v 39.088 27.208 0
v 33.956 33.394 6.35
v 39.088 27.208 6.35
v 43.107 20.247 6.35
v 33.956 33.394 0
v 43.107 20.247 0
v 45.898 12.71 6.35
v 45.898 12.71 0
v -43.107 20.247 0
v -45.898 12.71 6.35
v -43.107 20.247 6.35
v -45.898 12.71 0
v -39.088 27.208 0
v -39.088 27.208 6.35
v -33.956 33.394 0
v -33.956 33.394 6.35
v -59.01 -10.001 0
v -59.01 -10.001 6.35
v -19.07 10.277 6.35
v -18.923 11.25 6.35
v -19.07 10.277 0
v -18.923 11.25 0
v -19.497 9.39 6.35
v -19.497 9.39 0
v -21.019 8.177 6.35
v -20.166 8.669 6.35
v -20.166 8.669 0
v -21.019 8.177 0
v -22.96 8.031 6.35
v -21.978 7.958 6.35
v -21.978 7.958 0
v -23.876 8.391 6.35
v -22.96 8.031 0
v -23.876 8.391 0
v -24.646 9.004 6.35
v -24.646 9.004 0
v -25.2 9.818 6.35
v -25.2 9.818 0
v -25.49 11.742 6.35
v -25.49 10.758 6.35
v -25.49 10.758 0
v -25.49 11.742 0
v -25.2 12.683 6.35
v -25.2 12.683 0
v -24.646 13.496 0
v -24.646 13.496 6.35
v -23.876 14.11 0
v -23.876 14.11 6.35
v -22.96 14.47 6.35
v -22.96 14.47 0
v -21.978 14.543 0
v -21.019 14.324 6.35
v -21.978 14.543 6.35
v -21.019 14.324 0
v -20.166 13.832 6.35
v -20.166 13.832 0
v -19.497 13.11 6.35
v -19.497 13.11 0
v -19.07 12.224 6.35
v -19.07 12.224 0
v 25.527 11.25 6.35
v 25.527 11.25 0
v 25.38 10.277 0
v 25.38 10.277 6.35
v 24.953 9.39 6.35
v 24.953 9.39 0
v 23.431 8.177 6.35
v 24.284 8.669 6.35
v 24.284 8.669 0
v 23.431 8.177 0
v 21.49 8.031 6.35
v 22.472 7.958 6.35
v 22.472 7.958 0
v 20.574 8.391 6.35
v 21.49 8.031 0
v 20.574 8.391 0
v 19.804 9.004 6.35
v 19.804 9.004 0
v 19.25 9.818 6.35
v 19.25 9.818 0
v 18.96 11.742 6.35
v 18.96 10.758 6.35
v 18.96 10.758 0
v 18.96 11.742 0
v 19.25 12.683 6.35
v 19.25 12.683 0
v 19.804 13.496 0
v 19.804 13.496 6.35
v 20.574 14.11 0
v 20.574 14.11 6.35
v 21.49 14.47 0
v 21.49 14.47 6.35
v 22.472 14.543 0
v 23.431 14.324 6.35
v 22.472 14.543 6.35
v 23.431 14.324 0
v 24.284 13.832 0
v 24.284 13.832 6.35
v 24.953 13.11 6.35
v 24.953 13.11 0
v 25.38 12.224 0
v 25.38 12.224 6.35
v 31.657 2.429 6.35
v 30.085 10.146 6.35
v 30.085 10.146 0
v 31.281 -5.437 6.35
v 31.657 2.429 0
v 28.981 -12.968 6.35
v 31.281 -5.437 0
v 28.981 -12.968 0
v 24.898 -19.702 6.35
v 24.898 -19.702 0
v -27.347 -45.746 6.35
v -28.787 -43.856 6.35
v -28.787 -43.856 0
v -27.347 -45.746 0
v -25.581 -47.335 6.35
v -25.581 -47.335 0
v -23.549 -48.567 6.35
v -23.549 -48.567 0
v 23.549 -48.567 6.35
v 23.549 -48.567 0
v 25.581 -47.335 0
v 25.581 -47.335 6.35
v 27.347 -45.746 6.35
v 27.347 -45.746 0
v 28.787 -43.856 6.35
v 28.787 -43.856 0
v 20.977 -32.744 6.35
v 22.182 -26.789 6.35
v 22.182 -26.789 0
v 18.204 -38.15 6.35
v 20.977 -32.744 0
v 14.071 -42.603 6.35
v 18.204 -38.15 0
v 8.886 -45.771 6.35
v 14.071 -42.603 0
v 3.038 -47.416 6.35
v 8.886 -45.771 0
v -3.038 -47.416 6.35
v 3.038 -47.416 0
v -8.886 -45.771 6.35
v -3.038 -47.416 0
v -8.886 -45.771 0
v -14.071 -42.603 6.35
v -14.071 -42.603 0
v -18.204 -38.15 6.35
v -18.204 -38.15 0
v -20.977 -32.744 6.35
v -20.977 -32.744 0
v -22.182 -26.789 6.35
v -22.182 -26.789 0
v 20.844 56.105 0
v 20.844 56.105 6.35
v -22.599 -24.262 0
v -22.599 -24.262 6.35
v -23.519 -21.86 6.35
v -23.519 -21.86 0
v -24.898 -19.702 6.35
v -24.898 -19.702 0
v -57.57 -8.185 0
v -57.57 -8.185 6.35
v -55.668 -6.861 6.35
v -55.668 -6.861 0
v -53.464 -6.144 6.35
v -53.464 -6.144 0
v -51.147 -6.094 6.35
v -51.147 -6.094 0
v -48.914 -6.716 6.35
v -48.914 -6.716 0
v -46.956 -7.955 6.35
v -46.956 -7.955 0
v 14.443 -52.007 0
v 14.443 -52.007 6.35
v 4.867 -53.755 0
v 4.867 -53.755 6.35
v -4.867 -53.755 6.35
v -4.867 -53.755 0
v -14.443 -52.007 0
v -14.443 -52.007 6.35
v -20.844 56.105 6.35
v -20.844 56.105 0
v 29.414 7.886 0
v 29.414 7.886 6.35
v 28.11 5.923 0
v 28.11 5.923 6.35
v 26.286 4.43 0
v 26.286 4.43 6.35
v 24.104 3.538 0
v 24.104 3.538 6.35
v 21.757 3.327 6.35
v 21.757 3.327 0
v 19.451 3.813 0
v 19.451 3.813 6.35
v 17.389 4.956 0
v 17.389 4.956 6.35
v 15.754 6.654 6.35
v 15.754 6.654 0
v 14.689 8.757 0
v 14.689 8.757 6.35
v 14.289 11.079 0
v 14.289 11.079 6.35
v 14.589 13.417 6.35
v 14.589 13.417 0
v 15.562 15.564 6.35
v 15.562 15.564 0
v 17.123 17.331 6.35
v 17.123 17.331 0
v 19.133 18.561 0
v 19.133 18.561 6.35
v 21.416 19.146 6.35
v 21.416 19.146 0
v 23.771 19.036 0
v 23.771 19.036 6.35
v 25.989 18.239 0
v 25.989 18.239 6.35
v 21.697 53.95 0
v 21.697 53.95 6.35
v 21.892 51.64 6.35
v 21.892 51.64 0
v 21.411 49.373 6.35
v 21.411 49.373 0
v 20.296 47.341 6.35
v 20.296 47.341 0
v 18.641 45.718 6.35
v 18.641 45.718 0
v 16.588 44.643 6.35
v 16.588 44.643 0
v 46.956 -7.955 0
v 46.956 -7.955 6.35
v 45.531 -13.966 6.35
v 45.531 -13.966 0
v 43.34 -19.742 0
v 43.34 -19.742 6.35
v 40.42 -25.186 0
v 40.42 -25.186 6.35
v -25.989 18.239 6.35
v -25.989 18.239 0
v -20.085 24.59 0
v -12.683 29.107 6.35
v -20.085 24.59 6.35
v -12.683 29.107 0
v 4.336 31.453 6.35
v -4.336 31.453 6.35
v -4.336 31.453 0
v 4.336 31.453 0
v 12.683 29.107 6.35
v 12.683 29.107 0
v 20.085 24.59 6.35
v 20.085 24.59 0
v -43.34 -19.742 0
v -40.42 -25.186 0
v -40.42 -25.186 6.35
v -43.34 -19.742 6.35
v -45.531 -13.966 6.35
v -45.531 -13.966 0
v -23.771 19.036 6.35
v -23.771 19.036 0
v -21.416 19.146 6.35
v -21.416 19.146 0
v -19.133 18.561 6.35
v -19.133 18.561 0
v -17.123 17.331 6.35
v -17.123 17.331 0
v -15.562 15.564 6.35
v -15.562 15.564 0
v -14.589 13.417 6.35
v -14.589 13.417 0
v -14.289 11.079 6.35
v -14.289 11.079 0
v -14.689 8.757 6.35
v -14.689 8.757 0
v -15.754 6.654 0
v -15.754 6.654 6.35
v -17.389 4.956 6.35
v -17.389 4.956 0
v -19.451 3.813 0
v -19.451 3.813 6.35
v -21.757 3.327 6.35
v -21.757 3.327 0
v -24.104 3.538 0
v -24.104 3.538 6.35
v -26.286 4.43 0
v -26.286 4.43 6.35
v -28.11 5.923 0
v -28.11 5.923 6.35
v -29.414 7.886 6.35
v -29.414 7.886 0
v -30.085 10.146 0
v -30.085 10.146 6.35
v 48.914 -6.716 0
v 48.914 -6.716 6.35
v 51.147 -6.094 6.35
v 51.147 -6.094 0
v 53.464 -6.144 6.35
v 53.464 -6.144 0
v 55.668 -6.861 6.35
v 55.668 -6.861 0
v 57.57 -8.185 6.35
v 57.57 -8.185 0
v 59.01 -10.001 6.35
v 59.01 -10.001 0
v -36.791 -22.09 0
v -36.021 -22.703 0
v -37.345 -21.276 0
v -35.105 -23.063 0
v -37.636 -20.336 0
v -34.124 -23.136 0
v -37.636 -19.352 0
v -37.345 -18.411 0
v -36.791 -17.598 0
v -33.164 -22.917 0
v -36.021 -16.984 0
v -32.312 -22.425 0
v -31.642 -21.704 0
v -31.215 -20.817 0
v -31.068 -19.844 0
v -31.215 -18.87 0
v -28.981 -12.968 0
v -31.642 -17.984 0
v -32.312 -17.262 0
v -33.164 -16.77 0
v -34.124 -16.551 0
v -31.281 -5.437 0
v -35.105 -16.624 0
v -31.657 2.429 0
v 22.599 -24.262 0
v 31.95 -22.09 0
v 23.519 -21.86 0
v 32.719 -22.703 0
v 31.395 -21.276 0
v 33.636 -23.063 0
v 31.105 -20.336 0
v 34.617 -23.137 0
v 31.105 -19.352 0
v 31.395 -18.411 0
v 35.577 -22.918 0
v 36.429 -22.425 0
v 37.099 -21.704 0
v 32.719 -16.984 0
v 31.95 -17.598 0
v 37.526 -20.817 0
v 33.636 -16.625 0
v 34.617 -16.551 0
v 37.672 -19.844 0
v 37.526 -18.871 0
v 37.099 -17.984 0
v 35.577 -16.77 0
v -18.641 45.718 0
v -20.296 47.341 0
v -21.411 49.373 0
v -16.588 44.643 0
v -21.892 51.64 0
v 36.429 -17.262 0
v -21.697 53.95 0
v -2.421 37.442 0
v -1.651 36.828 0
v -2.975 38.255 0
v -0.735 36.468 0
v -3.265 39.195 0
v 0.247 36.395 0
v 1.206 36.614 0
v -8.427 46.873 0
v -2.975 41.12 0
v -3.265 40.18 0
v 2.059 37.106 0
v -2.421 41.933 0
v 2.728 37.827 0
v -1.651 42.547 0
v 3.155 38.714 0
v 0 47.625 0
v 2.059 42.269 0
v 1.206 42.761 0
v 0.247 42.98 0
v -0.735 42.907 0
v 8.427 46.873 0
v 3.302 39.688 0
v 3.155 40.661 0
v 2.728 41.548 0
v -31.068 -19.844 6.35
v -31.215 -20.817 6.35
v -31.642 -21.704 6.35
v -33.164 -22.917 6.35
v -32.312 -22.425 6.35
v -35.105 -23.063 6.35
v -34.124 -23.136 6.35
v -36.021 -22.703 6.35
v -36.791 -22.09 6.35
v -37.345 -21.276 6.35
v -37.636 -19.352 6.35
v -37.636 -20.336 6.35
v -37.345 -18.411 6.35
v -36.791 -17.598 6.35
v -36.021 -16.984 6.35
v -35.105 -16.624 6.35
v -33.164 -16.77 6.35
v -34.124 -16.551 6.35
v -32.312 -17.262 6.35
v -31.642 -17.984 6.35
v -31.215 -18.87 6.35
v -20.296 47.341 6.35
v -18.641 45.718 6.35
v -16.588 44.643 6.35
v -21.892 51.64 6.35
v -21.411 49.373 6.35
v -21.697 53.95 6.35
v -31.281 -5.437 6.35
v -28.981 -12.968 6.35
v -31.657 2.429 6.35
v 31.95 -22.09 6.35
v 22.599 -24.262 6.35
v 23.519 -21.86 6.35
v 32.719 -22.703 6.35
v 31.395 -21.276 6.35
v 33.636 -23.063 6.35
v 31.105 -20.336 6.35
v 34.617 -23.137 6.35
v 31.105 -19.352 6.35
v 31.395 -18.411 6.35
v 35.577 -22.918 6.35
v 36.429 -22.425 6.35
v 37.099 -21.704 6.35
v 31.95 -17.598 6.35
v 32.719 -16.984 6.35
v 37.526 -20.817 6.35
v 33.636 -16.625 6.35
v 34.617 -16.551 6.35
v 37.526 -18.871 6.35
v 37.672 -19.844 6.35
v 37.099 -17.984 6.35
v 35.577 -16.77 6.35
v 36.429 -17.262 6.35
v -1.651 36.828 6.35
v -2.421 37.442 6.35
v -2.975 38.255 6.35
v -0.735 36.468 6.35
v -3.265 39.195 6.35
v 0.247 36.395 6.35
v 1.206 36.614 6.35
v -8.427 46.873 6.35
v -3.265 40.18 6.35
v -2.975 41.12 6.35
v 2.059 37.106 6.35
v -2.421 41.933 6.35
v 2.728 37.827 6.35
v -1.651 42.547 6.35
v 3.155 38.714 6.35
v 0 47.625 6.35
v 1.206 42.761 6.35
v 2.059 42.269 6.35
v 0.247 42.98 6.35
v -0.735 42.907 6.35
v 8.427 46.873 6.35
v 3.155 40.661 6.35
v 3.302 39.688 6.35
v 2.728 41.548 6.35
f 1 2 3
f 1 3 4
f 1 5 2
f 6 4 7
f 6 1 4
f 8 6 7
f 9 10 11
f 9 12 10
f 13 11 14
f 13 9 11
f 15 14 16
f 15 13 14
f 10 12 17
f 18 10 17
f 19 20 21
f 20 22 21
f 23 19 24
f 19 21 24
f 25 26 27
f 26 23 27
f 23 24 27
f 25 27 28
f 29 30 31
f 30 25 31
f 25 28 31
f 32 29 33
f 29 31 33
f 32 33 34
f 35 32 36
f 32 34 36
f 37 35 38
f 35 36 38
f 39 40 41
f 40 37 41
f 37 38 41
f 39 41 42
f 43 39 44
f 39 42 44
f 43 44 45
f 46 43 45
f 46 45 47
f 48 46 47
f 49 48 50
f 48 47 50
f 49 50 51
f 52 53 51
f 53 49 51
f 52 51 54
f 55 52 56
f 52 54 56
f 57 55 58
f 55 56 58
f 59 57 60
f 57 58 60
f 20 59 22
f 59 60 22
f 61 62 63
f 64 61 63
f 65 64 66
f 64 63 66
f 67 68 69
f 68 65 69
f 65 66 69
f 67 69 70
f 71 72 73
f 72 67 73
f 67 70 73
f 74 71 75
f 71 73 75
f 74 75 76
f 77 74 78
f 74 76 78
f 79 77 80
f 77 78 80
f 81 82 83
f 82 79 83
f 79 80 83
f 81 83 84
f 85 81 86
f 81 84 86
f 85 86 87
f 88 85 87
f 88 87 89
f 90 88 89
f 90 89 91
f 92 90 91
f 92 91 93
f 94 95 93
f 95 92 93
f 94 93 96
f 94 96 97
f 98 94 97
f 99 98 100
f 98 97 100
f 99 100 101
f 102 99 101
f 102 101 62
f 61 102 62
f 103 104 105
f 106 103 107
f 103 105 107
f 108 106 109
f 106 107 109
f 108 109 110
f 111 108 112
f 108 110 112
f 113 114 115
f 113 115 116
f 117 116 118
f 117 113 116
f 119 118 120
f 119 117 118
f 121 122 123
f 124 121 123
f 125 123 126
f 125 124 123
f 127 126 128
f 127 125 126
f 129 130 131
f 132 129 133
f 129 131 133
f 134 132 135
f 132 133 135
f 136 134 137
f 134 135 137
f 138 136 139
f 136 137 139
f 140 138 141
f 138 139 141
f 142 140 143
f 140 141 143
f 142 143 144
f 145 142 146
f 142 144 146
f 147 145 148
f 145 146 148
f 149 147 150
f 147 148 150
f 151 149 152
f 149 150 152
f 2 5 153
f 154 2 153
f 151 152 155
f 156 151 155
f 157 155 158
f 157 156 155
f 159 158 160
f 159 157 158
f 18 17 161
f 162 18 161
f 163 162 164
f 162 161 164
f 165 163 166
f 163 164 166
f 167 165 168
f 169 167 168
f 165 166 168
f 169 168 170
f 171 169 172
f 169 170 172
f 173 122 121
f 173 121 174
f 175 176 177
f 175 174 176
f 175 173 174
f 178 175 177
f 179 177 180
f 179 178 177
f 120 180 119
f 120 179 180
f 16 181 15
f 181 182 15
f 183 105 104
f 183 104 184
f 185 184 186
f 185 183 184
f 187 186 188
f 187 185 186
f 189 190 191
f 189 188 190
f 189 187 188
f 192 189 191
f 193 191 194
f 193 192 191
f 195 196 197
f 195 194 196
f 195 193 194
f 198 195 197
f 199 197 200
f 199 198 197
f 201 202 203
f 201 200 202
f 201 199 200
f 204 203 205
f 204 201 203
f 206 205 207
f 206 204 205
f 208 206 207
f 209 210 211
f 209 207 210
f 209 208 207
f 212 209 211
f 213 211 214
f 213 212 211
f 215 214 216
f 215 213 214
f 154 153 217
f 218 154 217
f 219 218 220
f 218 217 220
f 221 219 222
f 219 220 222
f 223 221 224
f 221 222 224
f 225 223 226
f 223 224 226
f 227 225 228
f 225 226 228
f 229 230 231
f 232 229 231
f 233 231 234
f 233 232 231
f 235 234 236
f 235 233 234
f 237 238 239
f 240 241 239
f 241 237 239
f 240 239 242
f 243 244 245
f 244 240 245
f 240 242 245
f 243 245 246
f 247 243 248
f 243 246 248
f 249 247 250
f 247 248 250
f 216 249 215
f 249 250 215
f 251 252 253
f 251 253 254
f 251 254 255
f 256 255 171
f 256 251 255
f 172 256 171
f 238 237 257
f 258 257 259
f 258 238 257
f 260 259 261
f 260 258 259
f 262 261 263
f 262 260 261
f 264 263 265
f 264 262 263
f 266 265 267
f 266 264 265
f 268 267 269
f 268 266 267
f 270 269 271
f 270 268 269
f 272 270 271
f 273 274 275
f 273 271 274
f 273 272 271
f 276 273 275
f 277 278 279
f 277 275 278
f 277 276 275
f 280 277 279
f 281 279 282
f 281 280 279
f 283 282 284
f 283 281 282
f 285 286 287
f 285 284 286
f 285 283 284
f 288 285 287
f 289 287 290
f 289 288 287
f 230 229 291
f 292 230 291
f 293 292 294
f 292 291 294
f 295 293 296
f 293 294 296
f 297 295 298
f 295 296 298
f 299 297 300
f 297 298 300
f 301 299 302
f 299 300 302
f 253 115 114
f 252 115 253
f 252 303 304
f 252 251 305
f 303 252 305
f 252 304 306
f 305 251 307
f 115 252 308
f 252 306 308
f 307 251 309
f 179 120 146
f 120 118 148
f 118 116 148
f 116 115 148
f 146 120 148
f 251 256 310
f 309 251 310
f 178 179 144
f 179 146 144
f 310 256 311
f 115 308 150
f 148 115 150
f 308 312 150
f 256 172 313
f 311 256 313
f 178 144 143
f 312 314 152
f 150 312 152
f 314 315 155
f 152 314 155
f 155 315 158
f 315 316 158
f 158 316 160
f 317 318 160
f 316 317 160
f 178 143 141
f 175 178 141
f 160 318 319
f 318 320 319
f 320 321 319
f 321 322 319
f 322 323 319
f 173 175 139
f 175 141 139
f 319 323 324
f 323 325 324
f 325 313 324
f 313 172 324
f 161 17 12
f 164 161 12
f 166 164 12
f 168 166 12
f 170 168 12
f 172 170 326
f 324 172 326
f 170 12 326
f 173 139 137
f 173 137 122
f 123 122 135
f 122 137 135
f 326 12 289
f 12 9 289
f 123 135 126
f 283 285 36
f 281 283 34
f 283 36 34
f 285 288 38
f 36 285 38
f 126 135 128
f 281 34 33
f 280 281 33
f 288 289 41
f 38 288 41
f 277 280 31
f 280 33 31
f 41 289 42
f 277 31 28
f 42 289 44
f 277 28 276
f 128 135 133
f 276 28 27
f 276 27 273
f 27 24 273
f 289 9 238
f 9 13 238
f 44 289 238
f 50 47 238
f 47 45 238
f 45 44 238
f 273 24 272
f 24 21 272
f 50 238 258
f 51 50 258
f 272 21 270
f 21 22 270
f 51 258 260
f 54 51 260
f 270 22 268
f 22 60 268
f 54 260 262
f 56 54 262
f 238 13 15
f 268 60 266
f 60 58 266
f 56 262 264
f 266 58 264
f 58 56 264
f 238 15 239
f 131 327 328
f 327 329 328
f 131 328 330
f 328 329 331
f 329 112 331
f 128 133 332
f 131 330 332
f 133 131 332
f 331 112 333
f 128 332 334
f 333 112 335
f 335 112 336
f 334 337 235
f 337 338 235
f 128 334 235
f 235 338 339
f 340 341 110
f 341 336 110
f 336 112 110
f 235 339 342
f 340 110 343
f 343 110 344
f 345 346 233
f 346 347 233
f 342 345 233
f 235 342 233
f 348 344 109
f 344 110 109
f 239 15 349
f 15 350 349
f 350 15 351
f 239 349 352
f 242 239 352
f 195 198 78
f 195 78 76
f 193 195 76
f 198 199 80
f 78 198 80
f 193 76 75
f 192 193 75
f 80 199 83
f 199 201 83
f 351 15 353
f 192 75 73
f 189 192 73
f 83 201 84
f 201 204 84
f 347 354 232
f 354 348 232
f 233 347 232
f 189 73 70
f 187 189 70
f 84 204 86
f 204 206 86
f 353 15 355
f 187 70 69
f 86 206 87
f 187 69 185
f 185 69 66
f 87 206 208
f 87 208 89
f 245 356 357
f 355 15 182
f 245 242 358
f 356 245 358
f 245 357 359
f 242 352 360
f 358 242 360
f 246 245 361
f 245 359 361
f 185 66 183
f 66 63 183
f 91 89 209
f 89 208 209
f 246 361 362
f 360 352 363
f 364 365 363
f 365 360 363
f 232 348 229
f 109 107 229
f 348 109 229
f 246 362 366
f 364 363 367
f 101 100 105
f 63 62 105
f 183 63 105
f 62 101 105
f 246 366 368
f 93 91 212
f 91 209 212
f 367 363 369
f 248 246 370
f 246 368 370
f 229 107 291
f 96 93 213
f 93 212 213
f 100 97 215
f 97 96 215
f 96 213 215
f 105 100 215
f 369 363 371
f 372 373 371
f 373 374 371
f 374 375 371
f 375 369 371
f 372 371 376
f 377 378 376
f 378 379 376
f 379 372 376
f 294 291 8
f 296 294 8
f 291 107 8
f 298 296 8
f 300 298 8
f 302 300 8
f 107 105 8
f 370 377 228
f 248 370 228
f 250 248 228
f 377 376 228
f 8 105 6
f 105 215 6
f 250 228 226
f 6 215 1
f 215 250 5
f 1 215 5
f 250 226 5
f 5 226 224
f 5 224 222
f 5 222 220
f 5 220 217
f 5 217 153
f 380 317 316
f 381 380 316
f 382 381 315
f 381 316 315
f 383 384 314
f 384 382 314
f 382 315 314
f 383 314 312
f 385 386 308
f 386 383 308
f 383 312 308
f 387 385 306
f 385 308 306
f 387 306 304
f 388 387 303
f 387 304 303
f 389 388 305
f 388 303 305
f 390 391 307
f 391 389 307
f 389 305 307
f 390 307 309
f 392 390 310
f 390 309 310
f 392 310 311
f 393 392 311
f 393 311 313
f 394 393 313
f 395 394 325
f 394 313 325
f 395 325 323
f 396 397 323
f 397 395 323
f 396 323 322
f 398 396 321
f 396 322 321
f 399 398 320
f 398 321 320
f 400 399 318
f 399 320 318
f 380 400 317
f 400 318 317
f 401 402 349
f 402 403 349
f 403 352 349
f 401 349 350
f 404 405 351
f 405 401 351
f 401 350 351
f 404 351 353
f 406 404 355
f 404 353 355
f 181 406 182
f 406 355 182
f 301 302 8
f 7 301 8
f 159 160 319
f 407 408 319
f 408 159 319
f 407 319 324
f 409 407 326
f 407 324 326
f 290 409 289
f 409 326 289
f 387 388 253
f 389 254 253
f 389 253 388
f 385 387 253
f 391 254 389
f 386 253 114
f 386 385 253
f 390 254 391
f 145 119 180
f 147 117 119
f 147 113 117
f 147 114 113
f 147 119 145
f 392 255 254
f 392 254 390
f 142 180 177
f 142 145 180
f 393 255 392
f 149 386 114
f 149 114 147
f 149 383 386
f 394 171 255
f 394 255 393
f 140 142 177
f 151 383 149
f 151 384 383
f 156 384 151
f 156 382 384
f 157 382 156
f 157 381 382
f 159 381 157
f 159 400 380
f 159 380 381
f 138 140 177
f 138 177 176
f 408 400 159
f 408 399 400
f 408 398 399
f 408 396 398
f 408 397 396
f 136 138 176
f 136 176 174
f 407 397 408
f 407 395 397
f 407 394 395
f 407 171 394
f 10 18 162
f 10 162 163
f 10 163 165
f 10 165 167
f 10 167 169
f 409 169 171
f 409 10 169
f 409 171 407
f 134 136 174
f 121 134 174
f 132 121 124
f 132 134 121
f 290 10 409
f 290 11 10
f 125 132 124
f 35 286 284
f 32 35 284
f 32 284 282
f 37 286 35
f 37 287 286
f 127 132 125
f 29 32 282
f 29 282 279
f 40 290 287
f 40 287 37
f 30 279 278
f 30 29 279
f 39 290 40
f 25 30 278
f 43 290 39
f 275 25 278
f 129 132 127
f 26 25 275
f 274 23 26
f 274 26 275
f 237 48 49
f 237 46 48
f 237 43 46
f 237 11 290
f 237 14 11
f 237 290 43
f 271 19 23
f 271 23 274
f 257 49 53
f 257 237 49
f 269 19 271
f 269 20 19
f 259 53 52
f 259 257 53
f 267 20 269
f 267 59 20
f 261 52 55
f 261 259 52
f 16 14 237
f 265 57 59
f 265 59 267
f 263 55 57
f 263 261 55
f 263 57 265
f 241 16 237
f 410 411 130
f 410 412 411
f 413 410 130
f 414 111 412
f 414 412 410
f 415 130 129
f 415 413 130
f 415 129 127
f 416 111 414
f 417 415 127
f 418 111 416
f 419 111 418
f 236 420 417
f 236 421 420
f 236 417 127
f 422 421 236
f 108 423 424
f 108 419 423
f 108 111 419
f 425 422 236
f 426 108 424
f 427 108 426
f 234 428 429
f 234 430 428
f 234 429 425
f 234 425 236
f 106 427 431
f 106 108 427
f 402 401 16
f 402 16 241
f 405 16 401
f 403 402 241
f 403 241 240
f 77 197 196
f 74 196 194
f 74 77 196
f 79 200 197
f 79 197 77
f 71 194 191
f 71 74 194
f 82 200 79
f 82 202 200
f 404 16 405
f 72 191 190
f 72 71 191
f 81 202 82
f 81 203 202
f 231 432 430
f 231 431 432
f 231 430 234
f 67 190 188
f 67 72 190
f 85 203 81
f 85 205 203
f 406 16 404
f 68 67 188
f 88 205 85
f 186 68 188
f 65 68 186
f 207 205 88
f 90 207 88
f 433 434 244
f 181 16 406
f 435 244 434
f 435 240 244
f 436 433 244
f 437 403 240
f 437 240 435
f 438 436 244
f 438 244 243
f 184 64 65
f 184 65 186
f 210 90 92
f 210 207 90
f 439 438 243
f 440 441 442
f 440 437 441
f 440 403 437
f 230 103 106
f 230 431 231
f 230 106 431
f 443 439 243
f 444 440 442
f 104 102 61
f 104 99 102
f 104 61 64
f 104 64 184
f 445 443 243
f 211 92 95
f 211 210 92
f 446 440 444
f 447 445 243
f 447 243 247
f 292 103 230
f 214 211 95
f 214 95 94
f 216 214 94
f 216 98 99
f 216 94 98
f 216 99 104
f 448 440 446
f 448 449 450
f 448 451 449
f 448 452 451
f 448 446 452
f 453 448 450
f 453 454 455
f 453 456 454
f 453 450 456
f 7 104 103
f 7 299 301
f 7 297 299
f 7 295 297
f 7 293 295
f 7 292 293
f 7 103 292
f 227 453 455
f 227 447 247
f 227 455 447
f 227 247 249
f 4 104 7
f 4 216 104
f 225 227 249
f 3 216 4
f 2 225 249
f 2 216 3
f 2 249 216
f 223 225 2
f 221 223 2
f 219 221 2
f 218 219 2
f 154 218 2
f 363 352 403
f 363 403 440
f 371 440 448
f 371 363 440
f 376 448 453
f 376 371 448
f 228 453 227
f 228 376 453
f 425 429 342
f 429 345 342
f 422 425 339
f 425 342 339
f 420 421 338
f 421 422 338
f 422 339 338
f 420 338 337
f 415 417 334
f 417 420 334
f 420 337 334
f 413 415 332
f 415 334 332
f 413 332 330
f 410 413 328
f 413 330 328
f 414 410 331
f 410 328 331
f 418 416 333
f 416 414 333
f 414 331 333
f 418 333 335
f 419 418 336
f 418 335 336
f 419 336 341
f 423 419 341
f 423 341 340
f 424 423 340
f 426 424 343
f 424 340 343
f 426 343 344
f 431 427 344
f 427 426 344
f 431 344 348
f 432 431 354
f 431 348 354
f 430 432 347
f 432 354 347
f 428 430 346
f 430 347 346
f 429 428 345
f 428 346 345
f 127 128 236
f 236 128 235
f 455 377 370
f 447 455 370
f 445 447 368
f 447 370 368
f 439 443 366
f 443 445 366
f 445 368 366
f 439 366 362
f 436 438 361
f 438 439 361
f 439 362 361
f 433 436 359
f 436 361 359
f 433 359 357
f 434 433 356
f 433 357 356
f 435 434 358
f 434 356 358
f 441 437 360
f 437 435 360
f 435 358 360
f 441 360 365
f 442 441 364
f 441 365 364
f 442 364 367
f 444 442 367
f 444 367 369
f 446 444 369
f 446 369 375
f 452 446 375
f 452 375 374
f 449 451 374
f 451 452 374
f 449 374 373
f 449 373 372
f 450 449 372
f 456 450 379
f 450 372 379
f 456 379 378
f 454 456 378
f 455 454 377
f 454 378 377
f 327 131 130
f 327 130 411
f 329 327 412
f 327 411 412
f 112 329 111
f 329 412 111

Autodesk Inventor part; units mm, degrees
ref_plane "YZ Plane" through (0, 0, 0) normal (1, 0, 0) x (0, 1, 0)
ref_plane "XZ Plane" through (0, 0, 0) normal (0, 1, 0) x (-1, 0, 0)
ref_plane "XY Plane" through (0, 0, 0) normal (0, 0, 1) x (1, 0, 0)
sketch "Sketch1" plane through (0, 0, 0) normal (0, 0, 1) x (1, 0, 0)
  circle A0 centre (0, 0) radius 47.625
  line L0 (0, 0) -> (0, 47.625) construction
  circle A1 centre (0, 39.6875) radius 7.9375 construction
  circle A2 centre (0, 39.6875) radius 3.302
  circle A3 centre (-34.3704, -19.8437) radius 3.302
  circle A4 centre (34.3704, -19.8438) radius 3.302
  circle A5 centre (0, 0) radius 31.75
  circle A6 centre (0, -25.4) radius 22.225 construction
  circle A7 centre (0, -25.4) radius 22.225
  circle A8 centre (0, 0) radius 53.975
  line L1 (0, 0) -> (-26.9875, -46.7437)
  line L2 (0, 0) -> (26.9875, -46.7437)
  line L3 (-26.9875, -46.7437) -> (-40.4202, -25.1863)
  line L4 (26.9875, -46.7437) -> (40.4202, -25.1863)
  circle A9 centre (-34.3704, -19.8437) radius 7.9375 construction
  circle A10 centre (34.3704, -19.8438) radius 7.9375 construction
  circle A11 centre (0, 39.6875) radius 4.7625 construction
  circle A12 centre (-34.3704, -19.8437) radius 4.7625 construction
  circle A13 centre (34.3704, -19.8438) radius 4.7625 construction
  circle A14 centre (22.225, 11.2503) radius 20.6375 construction
  circle A15 centre (22.225, 11.2503) radius 3.302
  circle A16 centre (22.225, 11.2503) radius 7.9375
  circle A17 centre (-22.225, 11.2503) radius 3.302
  circle A18 centre (-22.225, 11.2503) radius 7.9375
  point P0 (-22.0748, -22.8203)
  point P1 (22.0748, -22.8203)
  point P2 (26.9875, -46.7437)
  point P3 (40.4202, -25.1863)
  dimension "d12" = 107.95
  dimension "d0" = 95.25
  dimension "d1" = 15.875
  dimension "d2" = 6.604
  dimension "d5" = 360
  dimension "d7" = 63.5
  dimension "d10" = 44.45
  dimension "d11" = 44.45
  dimension "d13" = 30
  dimension "d17" = 360
  dimension "d21" = 9.525
  dimension "d24" = 360
  dimension "d61" = 41.275
  dimension "d62" = 22.225
  dimension "d63" = 6.604
  dimension "d64" = 15.875
extrude "Extrusion1" add sketch "Sketch1" along normal blind 6.35 contours A0 L2 A7 A5 A16 A18 L1 | A0 L1 L3 | L4 L2 A0 | L1 A7 A0 | A0 L2 A8 L1 | A0 A7 L2 | A18 A5 | A5 A18 | A16 A5 | A5 A16
fillet "Fillet1" radius 12.7 4 edges at (-22.0748, -22.8203, 3.175) (22.0748, -22.8203, 3.175) (26.9875, -46.7437, 3.175) (-26.9875, -46.7437, 3.175)
sketch "Sketch2" plane through (0, 0, 0) normal (0, 0, -1) x (-1, 0, 0)
  point P0 (-38.1661, -38.1661)
  point P1 (-52.1358, -13.9698)
  point P2 (-13.9698, 52.1358)
  point P3 (13.9698, 52.1358)
  point P4 (52.1358, -13.9698)
  point P5 (38.1661, -38.1661)
hole "Hole1" at (38.1661, -38.1661, 0) at (52.1358, -13.9698, 0) at (13.9698, 52.1358, 0) at (-13.9698, 52.1358, 0) at (-52.1358, -13.9698, 0) at (-38.1661, -38.1661, 0) direction (0, 0, 1) diameter 6.604 end through all
sketch "Sketch3" plane through (0, 0, 0) normal (0, 0, -1) x (-1, 0, 0)
  circle A0 centre (13.9698, 52.1358) radius 3.302 projected
  circle A1 centre (13.9698, 52.1358) radius 7.9375
  circle A2 centre (-13.9698, 52.1358) radius 3.302 projected
  circle A3 centre (-13.9698, 52.1358) radius 7.9375
  circle A4 centre (-52.1358, -13.9698) radius 7.9375
  circle A5 centre (-38.1661, -38.1661) radius 7.9375
  circle A6 centre (38.1661, -38.1661) radius 7.9375
  circle A7 centre (52.1358, -13.9698) radius 7.9375
  line L0 (20.8438, 56.1046) -> (59.0099, -10.001)
  line L1 (-59.0099, -10.001) -> (-20.8438, 56.1046)
  line L2 (38.1661, -46.1036) -> (-38.1661, -46.1036)
  arc A8 (44.3097, -15.2947) -> (8.9093, 46.0207) centre (-55.8649, -32.2536) ccw
  arc A9 (-8.9093, 46.0207) -> (-44.3097, -15.2947) centre (55.8649, -32.2536) ccw
  arc A10 (-35.4004, -30.726) -> (35.4004, -30.726) centre (0, 64.5072) ccw
  circle A11 centre (0, 0) radius 61.9125
  circle A12 centre (0, 39.6875) radius 3.302 projected
  circle A13 centre (0, 39.6875) radius 7.9375
  circle A14 centre (0, 0) radius 39.6875 construction
  point P0 (-44.3097, -15.2947)
  point P1 (-8.9093, 46.0207)
  point P2 (-16.0241, 59.8029)
  point P3 (-59.8029, -16.0241)
  point P4 (59.8029, -16.0241)
  point P5 (16.0241, 59.8029)
  dimension "d33" = 15.875
  dimension "d34" = 15.875
  dimension "d37" = 360
  dimension "d41" = 360
  dimension "d43" = 101.6
  dimension "d46" = 360
  dimension "d50" = 15.875
extrude "Extrusion2" add sketch "Sketch3" against normal blind 6.35 contours A1 L0 A7 A8 | A3 A9 A4 L1
sketch "Sketch4" plane through (0, 0, 6.35) normal (0, 0, 1) x (1, 0, 0)
  arc A0 (-46.9558, -7.9555) -> (-40.4202, -25.1863) centre (0, 0) ccw projected
  line L0 (-40.4202, -25.1863) -> (-28.7871, -43.8556) projected
  arc A1 (-28.7871, -43.8556) -> (-23.5495, -48.5667) centre (-18.0084, -37.1392) ccw projected
  arc A2 (-23.5495, -48.5667) -> (23.5495, -48.5667) centre (0, 0) ccw projected
  arc A3 (23.5495, -48.5667) -> (28.7871, -43.8556) centre (18.0084, -37.1392) ccw projected
  line L1 (28.7871, -43.8556) -> (40.4202, -25.1863) projected
  arc A4 (40.4202, -25.1863) -> (46.9558, -7.9555) centre (0, 0) ccw projected
  line L2 (59.0099, -10.001) -> (20.8438, 56.1046) projected
  arc A5 (16.5883, 44.6427) -> (-16.5883, 44.6427) centre (0, 0) ccw projected
  line L3 (-20.8438, 56.1046) -> (-59.0099, -10.001) projected
  arc A6 (16.6623, -41.2089) -> (42.2431, -13.832) centre (0, 0) ccw projected
  arc A7 (16.6623, -41.2089) -> (13.6328, -42.9527) centre (21.423, -52.9828) ccw projected
  arc A8 (-13.6328, -42.9527) -> (13.6328, -42.9527) centre (0, -25.4) ccw projected
  arc A9 (-13.6328, -42.9527) -> (-16.6623, -41.2089) centre (-21.423, -52.9828) ccw projected
  arc A10 (-42.2431, -13.832) -> (-16.6623, -41.2089) centre (0, 0) ccw projected
  arc A11 (-42.4649, -6.6838) -> (-42.2431, -13.832) centre (-30.1736, -9.88) ccw projected
  arc A12 (-15.4441, 40.1175) -> (-42.4649, -6.6838) centre (55.8649, -32.2536) ccw projected
  arc A13 (-9.1427, 43.4996) -> (-15.4441, 40.1175) centre (-6.5305, 31.0711) ccw projected
  arc A14 (9.1427, 43.4996) -> (-9.1427, 43.4996) centre (0, 0) ccw projected
  arc A15 (15.4441, 40.1175) -> (9.1427, 43.4996) centre (6.5305, 31.0711) ccw projected
  arc A16 (42.4649, -6.6838) -> (15.4441, 40.1175) centre (-55.8649, -32.2536) ccw projected
  arc A17 (42.2431, -13.832) -> (42.4649, -6.6838) centre (30.1736, -9.88) ccw projected
  arc A18 (17.6725, 42.3791) -> (9.7957, 46.6067) centre (6.5305, 31.0711) ccw
  arc A19 (9.7957, 46.6067) -> (-9.7957, 46.6067) centre (0, 0) ccw
  arc A20 (-9.7957, 46.6067) -> (-17.6725, 42.3791) centre (-6.5305, 31.0711) ccw
  arc A21 (-17.6725, 42.3791) -> (-45.5377, -5.8847) centre (55.8649, -32.2536) ccw
  arc A22 (-45.5377, -5.8847) -> (-45.2604, -14.82) centre (-30.1736, -9.88) ccw
  arc A23 (-45.2604, -14.82) -> (-17.8525, -44.1523) centre (0, 0) ccw
  arc A24 (-15.5803, -45.4602) -> (-17.8525, -44.1523) centre (-21.423, -52.9828) ccw
  arc A25 (-15.5803, -45.4602) -> (15.5803, -45.4602) centre (0, -25.4) ccw
  arc A26 (17.8525, -44.1523) -> (15.5803, -45.4602) centre (21.423, -52.9828) ccw
  arc A27 (17.8525, -44.1523) -> (45.2604, -14.82) centre (0, 0) ccw
  arc A28 (45.2604, -14.82) -> (45.5377, -5.8847) centre (30.1736, -9.88) ccw
  arc A29 (45.5377, -5.8847) -> (17.6725, 42.3791) centre (-55.8649, -32.2536) ccw
  circle A30 centre (52.1358, -13.9698) radius 7.9375
  circle A31 centre (38.1661, -38.1661) radius 7.9375
  line L4 (0, 0) -> (0, -47.625) construction
  arc A32 (-13.6328, -42.9527) -> (13.6328, -42.9527) centre (0, -25.4) ccw projected
  circle A33 centre (13.9698, 52.1358) radius 3.302 projected
  circle A34 centre (13.9698, 52.1358) radius 7.9375
  circle A35 centre (-52.1358, -13.9698) radius 7.9375
  circle A36 centre (-38.1661, -38.1661) radius 7.9375
  circle A37 centre (-13.9698, 52.1358) radius 7.9375
  circle A38 centre (22.225, 11.2503) radius 7.9375 projected
  circle A39 centre (-22.225, 11.2503) radius 7.9375 projected
  arc A40 (16.5883, 44.6427) -> (20.8438, 56.1046) centre (13.9698, 52.1358) ccw projected
  arc A41 (-20.8438, 56.1046) -> (-16.5883, 44.6427) centre (-13.9698, 52.1358) ccw projected
  arc A42 (-46.9558, -7.9555) -> (-59.0099, -10.001) centre (-52.1358, -13.9698) ccw projected
  arc A43 (59.0099, -10.001) -> (46.9558, -7.9555) centre (52.1358, -13.9698) ccw projected
  point P0 (-46.019, -8.9112)
  point P1 (-15.2922, 44.3093)
  point P2 (15.2922, 44.3093)
  point P3 (46.019, -8.9112)
  point P4 (37.2448, -30.2822)
  point P5 (30.5492, -40.3992)
  point P6 (-30.5492, -40.3992)
  point P7 (-30.683, -40.8131)
  point P8 (-44.6427, -16.5883)
  point P9 (9.7957, 46.6067)
  point P10 (-7.9555, 46.9558)
  point P11 (-16.5883, 44.6427)
  point P12 (-9.7957, 46.6067)
  point P13 (-44.7415, -16.8555)
  point P14 (-46.9558, -7.9555)
  point P15 (44.6427, -16.5883)
  point P16 (7.9555, 46.9558)
  point P17 (46.9558, -7.9555)
  point P18 (16.5883, 44.6427)
  point P19 (36.6872, -30.3676)
  point P20 (30.3676, -36.6872)
  point P21 (-30.3676, -36.6872)
  point P22 (-36.6872, -30.3676)
  point P23 (45.2604, -14.82)
  point P24 (-44.6427, -16.5883)
  point P25 (-40.4202, -25.1863)
  point P26 (-40.4202, -25.1863)
  point P27 (44.6427, -16.5883)
  point P28 (-37.2448, -30.2822)
  point P29 (30.683, -40.8131)
  dimension "d54" = 3.175
  dimension "d55" = 15.875
  dimension "d56" = 15.875
  dimension "d57" = 15.875
sketch "Sketch5" plane through (0, 0, 6.35) normal (0, 0, 1) x (1, 0, 0)
  arc A0 (-27.9283, -37.7947) -> (27.9283, -37.7947) centre (0, -31.75) ccw projected
  line L0 (0, 0) -> (0, -31.75) construction
  circle A1 centre (0, -60.325) radius 6.35
  dimension "d65" = 12.7
equation "\"d0\" = Ring_ID"
equation "\"d10\" = Pulley_OD"
equation "\"d11\" = Pulley_OD"
equation "\"d61\" = Brass_OD"
equation "\"d62\" = Brass_Offset"
equation "\"Ring_ID\" = 95.25"
equation "\"Pulley_OD\" = 44.45"
equation "\"Brass_OD\" = 41.275"
equation "\"Brass_Offset\" = 22.225"
properties part number "Support Ring" material "UHMW, White"
